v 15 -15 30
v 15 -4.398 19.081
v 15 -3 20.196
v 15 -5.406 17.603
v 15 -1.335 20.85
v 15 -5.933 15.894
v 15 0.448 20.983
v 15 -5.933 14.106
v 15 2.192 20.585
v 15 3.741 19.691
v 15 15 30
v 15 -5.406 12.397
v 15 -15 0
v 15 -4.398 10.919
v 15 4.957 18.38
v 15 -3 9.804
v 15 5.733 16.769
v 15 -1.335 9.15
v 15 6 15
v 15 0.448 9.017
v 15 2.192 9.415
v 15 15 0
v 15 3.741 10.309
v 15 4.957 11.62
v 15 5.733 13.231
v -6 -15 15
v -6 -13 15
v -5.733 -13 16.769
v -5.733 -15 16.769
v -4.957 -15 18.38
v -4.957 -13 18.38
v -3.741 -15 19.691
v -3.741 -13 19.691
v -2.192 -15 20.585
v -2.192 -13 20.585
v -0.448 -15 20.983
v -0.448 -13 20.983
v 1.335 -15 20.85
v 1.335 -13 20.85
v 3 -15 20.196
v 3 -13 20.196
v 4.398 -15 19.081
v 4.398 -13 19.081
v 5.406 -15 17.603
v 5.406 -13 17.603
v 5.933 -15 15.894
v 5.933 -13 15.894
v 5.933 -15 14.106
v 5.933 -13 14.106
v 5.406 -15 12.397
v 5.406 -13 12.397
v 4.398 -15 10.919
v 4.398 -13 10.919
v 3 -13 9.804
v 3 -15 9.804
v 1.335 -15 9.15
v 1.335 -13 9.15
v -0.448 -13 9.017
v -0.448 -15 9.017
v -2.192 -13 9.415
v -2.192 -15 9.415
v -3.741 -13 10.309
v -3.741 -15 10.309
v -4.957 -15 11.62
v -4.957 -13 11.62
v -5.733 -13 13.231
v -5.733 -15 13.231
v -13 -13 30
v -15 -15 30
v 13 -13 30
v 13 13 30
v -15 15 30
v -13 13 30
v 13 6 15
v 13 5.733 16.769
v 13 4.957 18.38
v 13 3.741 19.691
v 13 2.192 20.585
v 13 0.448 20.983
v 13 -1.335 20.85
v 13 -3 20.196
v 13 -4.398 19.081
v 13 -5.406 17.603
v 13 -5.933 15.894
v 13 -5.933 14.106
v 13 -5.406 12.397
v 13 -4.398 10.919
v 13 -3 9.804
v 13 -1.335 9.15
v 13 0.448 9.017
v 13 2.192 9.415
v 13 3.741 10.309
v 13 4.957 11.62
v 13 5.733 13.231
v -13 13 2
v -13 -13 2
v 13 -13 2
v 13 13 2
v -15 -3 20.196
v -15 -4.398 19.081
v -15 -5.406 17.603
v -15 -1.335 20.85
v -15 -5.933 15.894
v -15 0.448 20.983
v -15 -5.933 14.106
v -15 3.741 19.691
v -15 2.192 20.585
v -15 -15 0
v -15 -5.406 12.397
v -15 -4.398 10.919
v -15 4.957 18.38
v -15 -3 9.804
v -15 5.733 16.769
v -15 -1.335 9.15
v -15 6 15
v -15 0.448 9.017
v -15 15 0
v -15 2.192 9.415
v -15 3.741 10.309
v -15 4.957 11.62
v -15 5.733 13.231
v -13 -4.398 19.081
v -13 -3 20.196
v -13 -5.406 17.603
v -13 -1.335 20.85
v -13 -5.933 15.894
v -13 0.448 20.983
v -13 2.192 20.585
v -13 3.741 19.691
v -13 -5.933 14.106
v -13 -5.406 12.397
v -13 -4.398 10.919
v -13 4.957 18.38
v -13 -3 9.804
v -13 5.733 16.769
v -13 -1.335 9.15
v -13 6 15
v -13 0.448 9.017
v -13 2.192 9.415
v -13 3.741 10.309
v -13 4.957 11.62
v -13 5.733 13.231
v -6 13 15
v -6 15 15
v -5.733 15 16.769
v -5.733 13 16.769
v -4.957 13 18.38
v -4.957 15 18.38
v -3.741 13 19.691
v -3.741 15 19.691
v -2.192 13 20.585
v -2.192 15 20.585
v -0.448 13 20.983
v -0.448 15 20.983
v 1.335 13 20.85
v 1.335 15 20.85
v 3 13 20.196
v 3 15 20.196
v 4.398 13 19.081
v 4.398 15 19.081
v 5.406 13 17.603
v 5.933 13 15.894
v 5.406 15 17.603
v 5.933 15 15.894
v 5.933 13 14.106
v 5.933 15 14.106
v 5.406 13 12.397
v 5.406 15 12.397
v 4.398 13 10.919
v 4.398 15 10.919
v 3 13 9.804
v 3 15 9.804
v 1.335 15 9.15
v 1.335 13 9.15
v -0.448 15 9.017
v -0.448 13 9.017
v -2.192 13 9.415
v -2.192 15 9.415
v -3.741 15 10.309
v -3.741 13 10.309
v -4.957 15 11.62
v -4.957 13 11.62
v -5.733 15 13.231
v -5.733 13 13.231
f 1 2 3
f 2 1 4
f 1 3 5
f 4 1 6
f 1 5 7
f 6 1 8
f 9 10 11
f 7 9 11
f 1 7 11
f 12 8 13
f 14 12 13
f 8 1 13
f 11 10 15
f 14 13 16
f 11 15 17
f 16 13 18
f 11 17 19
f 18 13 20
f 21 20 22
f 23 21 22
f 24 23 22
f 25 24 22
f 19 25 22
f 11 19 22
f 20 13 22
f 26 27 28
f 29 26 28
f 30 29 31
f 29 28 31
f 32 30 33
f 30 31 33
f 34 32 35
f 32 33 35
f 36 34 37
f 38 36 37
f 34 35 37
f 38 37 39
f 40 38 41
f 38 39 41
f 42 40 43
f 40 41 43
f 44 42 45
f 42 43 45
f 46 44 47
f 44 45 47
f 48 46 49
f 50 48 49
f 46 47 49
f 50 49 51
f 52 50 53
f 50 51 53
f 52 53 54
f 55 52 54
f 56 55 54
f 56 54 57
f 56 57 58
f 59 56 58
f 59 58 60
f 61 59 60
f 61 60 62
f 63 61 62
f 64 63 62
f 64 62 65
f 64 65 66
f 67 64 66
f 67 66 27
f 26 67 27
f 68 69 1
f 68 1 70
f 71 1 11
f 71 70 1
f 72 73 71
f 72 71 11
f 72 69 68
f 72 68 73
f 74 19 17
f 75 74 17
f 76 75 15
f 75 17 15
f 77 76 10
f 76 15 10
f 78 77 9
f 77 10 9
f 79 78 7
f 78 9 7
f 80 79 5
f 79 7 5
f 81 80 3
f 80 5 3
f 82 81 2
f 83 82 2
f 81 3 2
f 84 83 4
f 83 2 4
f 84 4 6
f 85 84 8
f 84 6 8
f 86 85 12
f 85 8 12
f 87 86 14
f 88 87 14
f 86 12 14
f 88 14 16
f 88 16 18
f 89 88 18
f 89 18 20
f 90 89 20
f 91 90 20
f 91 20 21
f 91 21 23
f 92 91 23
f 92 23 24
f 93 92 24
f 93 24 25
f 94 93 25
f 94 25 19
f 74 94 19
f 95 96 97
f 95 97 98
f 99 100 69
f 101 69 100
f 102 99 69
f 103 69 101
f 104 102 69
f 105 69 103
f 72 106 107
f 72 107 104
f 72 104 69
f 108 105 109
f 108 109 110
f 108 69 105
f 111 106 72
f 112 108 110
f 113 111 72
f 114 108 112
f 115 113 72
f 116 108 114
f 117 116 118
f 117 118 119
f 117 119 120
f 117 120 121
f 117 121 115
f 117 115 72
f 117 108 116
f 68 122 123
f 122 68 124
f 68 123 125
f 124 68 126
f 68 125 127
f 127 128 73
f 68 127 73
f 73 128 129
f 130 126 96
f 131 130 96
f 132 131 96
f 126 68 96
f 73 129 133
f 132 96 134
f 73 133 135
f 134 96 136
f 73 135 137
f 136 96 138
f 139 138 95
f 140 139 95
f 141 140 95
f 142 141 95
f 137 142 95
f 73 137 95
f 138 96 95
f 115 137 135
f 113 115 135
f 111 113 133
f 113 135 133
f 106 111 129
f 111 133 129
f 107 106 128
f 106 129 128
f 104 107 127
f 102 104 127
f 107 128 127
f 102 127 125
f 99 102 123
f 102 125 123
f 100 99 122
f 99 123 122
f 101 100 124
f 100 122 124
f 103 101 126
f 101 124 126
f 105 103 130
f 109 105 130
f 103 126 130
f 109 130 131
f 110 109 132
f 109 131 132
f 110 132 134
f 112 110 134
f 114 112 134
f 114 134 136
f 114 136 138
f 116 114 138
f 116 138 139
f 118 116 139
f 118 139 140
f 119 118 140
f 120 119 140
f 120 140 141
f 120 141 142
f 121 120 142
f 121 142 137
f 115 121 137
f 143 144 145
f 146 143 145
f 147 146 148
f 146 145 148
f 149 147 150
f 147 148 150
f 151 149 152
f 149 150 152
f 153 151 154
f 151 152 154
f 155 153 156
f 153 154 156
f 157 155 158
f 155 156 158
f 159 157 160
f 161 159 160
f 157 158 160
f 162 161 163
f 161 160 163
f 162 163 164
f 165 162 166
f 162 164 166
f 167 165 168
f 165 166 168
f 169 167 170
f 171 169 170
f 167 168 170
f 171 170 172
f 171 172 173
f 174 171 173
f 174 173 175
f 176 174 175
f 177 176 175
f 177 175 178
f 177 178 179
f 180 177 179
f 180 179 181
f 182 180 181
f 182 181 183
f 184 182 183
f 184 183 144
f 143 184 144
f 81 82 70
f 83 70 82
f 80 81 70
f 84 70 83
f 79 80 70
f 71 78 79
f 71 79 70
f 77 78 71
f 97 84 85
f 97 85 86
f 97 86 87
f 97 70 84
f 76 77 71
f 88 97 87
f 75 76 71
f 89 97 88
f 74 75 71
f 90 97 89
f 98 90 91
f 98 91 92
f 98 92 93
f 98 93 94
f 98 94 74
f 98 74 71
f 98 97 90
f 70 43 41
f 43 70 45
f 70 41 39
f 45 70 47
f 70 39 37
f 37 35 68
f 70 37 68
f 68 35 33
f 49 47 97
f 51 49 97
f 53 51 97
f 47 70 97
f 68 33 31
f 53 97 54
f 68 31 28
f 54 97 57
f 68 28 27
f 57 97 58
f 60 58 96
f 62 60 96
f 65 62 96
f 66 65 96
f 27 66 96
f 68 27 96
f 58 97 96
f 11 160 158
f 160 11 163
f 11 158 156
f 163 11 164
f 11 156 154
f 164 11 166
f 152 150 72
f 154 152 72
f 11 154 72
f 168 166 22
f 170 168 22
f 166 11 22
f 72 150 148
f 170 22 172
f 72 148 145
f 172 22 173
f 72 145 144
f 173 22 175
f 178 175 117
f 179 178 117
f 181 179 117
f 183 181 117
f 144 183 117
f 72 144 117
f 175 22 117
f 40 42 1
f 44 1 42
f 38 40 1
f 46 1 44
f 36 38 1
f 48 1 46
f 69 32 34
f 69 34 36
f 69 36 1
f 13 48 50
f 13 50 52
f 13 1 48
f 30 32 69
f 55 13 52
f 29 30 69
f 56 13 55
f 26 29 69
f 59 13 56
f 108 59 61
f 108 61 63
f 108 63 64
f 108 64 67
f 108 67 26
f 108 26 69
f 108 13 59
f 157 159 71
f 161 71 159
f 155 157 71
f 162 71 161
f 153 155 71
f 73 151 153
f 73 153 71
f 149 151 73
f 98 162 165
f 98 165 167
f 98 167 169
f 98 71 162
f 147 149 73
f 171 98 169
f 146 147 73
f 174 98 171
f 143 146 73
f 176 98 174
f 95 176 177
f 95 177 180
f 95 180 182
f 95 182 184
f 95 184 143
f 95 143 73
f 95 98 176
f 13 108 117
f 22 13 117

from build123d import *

# Parameters (mm, degrees)
SKETCH1_W           = 30
SKETCH1_H           = 30
BOSS_EXTRUDE1_DEPTH = 30
SHELL1_T            = -2
SKETCH2_R           = 6
CUT_EXTRUDE1_DEPTH  = 40
SKETCH3_R           = 6
CUT_EXTRUDE2_DEPTH  = 40


with BuildPart() as part:
    # Sketch1 → Boss-Extrude1 (new body)
    with BuildSketch(Plane(origin=(0, 0, 0), x_dir=(0, 1, 0), z_dir=(0, 0, 1))):
        Rectangle(SKETCH1_W, SKETCH1_H)
    extrude(amount=BOSS_EXTRUDE1_DEPTH)

    # Shell1
    shell1_openings = [part.faces().sort_by_distance(p)[0] for p in [
        (0, 0, 30),
    ]]
    offset(amount=SHELL1_T, openings=shell1_openings, kind=Kind.INTERSECTION)

    # Sketch2 → Cut-Extrude1 (cut)
    with BuildSketch(Plane(origin=(0, 15, 0), x_dir=(-1, 0, 0), z_dir=(0, 1, 0))):
        with Locations((0, 15)):
            Circle(SKETCH2_R)
    extrude(amount=-CUT_EXTRUDE1_DEPTH, mode=Mode.SUBTRACT)

    # Sketch3 → Cut-Extrude2 (cut)
    with BuildSketch(Plane.YZ.offset(15)):
        with Locations((0, 15)):
            Circle(SKETCH3_R)
    extrude(amount=-CUT_EXTRUDE2_DEPTH, mode=Mode.SUBTRACT)


solid = part.part
